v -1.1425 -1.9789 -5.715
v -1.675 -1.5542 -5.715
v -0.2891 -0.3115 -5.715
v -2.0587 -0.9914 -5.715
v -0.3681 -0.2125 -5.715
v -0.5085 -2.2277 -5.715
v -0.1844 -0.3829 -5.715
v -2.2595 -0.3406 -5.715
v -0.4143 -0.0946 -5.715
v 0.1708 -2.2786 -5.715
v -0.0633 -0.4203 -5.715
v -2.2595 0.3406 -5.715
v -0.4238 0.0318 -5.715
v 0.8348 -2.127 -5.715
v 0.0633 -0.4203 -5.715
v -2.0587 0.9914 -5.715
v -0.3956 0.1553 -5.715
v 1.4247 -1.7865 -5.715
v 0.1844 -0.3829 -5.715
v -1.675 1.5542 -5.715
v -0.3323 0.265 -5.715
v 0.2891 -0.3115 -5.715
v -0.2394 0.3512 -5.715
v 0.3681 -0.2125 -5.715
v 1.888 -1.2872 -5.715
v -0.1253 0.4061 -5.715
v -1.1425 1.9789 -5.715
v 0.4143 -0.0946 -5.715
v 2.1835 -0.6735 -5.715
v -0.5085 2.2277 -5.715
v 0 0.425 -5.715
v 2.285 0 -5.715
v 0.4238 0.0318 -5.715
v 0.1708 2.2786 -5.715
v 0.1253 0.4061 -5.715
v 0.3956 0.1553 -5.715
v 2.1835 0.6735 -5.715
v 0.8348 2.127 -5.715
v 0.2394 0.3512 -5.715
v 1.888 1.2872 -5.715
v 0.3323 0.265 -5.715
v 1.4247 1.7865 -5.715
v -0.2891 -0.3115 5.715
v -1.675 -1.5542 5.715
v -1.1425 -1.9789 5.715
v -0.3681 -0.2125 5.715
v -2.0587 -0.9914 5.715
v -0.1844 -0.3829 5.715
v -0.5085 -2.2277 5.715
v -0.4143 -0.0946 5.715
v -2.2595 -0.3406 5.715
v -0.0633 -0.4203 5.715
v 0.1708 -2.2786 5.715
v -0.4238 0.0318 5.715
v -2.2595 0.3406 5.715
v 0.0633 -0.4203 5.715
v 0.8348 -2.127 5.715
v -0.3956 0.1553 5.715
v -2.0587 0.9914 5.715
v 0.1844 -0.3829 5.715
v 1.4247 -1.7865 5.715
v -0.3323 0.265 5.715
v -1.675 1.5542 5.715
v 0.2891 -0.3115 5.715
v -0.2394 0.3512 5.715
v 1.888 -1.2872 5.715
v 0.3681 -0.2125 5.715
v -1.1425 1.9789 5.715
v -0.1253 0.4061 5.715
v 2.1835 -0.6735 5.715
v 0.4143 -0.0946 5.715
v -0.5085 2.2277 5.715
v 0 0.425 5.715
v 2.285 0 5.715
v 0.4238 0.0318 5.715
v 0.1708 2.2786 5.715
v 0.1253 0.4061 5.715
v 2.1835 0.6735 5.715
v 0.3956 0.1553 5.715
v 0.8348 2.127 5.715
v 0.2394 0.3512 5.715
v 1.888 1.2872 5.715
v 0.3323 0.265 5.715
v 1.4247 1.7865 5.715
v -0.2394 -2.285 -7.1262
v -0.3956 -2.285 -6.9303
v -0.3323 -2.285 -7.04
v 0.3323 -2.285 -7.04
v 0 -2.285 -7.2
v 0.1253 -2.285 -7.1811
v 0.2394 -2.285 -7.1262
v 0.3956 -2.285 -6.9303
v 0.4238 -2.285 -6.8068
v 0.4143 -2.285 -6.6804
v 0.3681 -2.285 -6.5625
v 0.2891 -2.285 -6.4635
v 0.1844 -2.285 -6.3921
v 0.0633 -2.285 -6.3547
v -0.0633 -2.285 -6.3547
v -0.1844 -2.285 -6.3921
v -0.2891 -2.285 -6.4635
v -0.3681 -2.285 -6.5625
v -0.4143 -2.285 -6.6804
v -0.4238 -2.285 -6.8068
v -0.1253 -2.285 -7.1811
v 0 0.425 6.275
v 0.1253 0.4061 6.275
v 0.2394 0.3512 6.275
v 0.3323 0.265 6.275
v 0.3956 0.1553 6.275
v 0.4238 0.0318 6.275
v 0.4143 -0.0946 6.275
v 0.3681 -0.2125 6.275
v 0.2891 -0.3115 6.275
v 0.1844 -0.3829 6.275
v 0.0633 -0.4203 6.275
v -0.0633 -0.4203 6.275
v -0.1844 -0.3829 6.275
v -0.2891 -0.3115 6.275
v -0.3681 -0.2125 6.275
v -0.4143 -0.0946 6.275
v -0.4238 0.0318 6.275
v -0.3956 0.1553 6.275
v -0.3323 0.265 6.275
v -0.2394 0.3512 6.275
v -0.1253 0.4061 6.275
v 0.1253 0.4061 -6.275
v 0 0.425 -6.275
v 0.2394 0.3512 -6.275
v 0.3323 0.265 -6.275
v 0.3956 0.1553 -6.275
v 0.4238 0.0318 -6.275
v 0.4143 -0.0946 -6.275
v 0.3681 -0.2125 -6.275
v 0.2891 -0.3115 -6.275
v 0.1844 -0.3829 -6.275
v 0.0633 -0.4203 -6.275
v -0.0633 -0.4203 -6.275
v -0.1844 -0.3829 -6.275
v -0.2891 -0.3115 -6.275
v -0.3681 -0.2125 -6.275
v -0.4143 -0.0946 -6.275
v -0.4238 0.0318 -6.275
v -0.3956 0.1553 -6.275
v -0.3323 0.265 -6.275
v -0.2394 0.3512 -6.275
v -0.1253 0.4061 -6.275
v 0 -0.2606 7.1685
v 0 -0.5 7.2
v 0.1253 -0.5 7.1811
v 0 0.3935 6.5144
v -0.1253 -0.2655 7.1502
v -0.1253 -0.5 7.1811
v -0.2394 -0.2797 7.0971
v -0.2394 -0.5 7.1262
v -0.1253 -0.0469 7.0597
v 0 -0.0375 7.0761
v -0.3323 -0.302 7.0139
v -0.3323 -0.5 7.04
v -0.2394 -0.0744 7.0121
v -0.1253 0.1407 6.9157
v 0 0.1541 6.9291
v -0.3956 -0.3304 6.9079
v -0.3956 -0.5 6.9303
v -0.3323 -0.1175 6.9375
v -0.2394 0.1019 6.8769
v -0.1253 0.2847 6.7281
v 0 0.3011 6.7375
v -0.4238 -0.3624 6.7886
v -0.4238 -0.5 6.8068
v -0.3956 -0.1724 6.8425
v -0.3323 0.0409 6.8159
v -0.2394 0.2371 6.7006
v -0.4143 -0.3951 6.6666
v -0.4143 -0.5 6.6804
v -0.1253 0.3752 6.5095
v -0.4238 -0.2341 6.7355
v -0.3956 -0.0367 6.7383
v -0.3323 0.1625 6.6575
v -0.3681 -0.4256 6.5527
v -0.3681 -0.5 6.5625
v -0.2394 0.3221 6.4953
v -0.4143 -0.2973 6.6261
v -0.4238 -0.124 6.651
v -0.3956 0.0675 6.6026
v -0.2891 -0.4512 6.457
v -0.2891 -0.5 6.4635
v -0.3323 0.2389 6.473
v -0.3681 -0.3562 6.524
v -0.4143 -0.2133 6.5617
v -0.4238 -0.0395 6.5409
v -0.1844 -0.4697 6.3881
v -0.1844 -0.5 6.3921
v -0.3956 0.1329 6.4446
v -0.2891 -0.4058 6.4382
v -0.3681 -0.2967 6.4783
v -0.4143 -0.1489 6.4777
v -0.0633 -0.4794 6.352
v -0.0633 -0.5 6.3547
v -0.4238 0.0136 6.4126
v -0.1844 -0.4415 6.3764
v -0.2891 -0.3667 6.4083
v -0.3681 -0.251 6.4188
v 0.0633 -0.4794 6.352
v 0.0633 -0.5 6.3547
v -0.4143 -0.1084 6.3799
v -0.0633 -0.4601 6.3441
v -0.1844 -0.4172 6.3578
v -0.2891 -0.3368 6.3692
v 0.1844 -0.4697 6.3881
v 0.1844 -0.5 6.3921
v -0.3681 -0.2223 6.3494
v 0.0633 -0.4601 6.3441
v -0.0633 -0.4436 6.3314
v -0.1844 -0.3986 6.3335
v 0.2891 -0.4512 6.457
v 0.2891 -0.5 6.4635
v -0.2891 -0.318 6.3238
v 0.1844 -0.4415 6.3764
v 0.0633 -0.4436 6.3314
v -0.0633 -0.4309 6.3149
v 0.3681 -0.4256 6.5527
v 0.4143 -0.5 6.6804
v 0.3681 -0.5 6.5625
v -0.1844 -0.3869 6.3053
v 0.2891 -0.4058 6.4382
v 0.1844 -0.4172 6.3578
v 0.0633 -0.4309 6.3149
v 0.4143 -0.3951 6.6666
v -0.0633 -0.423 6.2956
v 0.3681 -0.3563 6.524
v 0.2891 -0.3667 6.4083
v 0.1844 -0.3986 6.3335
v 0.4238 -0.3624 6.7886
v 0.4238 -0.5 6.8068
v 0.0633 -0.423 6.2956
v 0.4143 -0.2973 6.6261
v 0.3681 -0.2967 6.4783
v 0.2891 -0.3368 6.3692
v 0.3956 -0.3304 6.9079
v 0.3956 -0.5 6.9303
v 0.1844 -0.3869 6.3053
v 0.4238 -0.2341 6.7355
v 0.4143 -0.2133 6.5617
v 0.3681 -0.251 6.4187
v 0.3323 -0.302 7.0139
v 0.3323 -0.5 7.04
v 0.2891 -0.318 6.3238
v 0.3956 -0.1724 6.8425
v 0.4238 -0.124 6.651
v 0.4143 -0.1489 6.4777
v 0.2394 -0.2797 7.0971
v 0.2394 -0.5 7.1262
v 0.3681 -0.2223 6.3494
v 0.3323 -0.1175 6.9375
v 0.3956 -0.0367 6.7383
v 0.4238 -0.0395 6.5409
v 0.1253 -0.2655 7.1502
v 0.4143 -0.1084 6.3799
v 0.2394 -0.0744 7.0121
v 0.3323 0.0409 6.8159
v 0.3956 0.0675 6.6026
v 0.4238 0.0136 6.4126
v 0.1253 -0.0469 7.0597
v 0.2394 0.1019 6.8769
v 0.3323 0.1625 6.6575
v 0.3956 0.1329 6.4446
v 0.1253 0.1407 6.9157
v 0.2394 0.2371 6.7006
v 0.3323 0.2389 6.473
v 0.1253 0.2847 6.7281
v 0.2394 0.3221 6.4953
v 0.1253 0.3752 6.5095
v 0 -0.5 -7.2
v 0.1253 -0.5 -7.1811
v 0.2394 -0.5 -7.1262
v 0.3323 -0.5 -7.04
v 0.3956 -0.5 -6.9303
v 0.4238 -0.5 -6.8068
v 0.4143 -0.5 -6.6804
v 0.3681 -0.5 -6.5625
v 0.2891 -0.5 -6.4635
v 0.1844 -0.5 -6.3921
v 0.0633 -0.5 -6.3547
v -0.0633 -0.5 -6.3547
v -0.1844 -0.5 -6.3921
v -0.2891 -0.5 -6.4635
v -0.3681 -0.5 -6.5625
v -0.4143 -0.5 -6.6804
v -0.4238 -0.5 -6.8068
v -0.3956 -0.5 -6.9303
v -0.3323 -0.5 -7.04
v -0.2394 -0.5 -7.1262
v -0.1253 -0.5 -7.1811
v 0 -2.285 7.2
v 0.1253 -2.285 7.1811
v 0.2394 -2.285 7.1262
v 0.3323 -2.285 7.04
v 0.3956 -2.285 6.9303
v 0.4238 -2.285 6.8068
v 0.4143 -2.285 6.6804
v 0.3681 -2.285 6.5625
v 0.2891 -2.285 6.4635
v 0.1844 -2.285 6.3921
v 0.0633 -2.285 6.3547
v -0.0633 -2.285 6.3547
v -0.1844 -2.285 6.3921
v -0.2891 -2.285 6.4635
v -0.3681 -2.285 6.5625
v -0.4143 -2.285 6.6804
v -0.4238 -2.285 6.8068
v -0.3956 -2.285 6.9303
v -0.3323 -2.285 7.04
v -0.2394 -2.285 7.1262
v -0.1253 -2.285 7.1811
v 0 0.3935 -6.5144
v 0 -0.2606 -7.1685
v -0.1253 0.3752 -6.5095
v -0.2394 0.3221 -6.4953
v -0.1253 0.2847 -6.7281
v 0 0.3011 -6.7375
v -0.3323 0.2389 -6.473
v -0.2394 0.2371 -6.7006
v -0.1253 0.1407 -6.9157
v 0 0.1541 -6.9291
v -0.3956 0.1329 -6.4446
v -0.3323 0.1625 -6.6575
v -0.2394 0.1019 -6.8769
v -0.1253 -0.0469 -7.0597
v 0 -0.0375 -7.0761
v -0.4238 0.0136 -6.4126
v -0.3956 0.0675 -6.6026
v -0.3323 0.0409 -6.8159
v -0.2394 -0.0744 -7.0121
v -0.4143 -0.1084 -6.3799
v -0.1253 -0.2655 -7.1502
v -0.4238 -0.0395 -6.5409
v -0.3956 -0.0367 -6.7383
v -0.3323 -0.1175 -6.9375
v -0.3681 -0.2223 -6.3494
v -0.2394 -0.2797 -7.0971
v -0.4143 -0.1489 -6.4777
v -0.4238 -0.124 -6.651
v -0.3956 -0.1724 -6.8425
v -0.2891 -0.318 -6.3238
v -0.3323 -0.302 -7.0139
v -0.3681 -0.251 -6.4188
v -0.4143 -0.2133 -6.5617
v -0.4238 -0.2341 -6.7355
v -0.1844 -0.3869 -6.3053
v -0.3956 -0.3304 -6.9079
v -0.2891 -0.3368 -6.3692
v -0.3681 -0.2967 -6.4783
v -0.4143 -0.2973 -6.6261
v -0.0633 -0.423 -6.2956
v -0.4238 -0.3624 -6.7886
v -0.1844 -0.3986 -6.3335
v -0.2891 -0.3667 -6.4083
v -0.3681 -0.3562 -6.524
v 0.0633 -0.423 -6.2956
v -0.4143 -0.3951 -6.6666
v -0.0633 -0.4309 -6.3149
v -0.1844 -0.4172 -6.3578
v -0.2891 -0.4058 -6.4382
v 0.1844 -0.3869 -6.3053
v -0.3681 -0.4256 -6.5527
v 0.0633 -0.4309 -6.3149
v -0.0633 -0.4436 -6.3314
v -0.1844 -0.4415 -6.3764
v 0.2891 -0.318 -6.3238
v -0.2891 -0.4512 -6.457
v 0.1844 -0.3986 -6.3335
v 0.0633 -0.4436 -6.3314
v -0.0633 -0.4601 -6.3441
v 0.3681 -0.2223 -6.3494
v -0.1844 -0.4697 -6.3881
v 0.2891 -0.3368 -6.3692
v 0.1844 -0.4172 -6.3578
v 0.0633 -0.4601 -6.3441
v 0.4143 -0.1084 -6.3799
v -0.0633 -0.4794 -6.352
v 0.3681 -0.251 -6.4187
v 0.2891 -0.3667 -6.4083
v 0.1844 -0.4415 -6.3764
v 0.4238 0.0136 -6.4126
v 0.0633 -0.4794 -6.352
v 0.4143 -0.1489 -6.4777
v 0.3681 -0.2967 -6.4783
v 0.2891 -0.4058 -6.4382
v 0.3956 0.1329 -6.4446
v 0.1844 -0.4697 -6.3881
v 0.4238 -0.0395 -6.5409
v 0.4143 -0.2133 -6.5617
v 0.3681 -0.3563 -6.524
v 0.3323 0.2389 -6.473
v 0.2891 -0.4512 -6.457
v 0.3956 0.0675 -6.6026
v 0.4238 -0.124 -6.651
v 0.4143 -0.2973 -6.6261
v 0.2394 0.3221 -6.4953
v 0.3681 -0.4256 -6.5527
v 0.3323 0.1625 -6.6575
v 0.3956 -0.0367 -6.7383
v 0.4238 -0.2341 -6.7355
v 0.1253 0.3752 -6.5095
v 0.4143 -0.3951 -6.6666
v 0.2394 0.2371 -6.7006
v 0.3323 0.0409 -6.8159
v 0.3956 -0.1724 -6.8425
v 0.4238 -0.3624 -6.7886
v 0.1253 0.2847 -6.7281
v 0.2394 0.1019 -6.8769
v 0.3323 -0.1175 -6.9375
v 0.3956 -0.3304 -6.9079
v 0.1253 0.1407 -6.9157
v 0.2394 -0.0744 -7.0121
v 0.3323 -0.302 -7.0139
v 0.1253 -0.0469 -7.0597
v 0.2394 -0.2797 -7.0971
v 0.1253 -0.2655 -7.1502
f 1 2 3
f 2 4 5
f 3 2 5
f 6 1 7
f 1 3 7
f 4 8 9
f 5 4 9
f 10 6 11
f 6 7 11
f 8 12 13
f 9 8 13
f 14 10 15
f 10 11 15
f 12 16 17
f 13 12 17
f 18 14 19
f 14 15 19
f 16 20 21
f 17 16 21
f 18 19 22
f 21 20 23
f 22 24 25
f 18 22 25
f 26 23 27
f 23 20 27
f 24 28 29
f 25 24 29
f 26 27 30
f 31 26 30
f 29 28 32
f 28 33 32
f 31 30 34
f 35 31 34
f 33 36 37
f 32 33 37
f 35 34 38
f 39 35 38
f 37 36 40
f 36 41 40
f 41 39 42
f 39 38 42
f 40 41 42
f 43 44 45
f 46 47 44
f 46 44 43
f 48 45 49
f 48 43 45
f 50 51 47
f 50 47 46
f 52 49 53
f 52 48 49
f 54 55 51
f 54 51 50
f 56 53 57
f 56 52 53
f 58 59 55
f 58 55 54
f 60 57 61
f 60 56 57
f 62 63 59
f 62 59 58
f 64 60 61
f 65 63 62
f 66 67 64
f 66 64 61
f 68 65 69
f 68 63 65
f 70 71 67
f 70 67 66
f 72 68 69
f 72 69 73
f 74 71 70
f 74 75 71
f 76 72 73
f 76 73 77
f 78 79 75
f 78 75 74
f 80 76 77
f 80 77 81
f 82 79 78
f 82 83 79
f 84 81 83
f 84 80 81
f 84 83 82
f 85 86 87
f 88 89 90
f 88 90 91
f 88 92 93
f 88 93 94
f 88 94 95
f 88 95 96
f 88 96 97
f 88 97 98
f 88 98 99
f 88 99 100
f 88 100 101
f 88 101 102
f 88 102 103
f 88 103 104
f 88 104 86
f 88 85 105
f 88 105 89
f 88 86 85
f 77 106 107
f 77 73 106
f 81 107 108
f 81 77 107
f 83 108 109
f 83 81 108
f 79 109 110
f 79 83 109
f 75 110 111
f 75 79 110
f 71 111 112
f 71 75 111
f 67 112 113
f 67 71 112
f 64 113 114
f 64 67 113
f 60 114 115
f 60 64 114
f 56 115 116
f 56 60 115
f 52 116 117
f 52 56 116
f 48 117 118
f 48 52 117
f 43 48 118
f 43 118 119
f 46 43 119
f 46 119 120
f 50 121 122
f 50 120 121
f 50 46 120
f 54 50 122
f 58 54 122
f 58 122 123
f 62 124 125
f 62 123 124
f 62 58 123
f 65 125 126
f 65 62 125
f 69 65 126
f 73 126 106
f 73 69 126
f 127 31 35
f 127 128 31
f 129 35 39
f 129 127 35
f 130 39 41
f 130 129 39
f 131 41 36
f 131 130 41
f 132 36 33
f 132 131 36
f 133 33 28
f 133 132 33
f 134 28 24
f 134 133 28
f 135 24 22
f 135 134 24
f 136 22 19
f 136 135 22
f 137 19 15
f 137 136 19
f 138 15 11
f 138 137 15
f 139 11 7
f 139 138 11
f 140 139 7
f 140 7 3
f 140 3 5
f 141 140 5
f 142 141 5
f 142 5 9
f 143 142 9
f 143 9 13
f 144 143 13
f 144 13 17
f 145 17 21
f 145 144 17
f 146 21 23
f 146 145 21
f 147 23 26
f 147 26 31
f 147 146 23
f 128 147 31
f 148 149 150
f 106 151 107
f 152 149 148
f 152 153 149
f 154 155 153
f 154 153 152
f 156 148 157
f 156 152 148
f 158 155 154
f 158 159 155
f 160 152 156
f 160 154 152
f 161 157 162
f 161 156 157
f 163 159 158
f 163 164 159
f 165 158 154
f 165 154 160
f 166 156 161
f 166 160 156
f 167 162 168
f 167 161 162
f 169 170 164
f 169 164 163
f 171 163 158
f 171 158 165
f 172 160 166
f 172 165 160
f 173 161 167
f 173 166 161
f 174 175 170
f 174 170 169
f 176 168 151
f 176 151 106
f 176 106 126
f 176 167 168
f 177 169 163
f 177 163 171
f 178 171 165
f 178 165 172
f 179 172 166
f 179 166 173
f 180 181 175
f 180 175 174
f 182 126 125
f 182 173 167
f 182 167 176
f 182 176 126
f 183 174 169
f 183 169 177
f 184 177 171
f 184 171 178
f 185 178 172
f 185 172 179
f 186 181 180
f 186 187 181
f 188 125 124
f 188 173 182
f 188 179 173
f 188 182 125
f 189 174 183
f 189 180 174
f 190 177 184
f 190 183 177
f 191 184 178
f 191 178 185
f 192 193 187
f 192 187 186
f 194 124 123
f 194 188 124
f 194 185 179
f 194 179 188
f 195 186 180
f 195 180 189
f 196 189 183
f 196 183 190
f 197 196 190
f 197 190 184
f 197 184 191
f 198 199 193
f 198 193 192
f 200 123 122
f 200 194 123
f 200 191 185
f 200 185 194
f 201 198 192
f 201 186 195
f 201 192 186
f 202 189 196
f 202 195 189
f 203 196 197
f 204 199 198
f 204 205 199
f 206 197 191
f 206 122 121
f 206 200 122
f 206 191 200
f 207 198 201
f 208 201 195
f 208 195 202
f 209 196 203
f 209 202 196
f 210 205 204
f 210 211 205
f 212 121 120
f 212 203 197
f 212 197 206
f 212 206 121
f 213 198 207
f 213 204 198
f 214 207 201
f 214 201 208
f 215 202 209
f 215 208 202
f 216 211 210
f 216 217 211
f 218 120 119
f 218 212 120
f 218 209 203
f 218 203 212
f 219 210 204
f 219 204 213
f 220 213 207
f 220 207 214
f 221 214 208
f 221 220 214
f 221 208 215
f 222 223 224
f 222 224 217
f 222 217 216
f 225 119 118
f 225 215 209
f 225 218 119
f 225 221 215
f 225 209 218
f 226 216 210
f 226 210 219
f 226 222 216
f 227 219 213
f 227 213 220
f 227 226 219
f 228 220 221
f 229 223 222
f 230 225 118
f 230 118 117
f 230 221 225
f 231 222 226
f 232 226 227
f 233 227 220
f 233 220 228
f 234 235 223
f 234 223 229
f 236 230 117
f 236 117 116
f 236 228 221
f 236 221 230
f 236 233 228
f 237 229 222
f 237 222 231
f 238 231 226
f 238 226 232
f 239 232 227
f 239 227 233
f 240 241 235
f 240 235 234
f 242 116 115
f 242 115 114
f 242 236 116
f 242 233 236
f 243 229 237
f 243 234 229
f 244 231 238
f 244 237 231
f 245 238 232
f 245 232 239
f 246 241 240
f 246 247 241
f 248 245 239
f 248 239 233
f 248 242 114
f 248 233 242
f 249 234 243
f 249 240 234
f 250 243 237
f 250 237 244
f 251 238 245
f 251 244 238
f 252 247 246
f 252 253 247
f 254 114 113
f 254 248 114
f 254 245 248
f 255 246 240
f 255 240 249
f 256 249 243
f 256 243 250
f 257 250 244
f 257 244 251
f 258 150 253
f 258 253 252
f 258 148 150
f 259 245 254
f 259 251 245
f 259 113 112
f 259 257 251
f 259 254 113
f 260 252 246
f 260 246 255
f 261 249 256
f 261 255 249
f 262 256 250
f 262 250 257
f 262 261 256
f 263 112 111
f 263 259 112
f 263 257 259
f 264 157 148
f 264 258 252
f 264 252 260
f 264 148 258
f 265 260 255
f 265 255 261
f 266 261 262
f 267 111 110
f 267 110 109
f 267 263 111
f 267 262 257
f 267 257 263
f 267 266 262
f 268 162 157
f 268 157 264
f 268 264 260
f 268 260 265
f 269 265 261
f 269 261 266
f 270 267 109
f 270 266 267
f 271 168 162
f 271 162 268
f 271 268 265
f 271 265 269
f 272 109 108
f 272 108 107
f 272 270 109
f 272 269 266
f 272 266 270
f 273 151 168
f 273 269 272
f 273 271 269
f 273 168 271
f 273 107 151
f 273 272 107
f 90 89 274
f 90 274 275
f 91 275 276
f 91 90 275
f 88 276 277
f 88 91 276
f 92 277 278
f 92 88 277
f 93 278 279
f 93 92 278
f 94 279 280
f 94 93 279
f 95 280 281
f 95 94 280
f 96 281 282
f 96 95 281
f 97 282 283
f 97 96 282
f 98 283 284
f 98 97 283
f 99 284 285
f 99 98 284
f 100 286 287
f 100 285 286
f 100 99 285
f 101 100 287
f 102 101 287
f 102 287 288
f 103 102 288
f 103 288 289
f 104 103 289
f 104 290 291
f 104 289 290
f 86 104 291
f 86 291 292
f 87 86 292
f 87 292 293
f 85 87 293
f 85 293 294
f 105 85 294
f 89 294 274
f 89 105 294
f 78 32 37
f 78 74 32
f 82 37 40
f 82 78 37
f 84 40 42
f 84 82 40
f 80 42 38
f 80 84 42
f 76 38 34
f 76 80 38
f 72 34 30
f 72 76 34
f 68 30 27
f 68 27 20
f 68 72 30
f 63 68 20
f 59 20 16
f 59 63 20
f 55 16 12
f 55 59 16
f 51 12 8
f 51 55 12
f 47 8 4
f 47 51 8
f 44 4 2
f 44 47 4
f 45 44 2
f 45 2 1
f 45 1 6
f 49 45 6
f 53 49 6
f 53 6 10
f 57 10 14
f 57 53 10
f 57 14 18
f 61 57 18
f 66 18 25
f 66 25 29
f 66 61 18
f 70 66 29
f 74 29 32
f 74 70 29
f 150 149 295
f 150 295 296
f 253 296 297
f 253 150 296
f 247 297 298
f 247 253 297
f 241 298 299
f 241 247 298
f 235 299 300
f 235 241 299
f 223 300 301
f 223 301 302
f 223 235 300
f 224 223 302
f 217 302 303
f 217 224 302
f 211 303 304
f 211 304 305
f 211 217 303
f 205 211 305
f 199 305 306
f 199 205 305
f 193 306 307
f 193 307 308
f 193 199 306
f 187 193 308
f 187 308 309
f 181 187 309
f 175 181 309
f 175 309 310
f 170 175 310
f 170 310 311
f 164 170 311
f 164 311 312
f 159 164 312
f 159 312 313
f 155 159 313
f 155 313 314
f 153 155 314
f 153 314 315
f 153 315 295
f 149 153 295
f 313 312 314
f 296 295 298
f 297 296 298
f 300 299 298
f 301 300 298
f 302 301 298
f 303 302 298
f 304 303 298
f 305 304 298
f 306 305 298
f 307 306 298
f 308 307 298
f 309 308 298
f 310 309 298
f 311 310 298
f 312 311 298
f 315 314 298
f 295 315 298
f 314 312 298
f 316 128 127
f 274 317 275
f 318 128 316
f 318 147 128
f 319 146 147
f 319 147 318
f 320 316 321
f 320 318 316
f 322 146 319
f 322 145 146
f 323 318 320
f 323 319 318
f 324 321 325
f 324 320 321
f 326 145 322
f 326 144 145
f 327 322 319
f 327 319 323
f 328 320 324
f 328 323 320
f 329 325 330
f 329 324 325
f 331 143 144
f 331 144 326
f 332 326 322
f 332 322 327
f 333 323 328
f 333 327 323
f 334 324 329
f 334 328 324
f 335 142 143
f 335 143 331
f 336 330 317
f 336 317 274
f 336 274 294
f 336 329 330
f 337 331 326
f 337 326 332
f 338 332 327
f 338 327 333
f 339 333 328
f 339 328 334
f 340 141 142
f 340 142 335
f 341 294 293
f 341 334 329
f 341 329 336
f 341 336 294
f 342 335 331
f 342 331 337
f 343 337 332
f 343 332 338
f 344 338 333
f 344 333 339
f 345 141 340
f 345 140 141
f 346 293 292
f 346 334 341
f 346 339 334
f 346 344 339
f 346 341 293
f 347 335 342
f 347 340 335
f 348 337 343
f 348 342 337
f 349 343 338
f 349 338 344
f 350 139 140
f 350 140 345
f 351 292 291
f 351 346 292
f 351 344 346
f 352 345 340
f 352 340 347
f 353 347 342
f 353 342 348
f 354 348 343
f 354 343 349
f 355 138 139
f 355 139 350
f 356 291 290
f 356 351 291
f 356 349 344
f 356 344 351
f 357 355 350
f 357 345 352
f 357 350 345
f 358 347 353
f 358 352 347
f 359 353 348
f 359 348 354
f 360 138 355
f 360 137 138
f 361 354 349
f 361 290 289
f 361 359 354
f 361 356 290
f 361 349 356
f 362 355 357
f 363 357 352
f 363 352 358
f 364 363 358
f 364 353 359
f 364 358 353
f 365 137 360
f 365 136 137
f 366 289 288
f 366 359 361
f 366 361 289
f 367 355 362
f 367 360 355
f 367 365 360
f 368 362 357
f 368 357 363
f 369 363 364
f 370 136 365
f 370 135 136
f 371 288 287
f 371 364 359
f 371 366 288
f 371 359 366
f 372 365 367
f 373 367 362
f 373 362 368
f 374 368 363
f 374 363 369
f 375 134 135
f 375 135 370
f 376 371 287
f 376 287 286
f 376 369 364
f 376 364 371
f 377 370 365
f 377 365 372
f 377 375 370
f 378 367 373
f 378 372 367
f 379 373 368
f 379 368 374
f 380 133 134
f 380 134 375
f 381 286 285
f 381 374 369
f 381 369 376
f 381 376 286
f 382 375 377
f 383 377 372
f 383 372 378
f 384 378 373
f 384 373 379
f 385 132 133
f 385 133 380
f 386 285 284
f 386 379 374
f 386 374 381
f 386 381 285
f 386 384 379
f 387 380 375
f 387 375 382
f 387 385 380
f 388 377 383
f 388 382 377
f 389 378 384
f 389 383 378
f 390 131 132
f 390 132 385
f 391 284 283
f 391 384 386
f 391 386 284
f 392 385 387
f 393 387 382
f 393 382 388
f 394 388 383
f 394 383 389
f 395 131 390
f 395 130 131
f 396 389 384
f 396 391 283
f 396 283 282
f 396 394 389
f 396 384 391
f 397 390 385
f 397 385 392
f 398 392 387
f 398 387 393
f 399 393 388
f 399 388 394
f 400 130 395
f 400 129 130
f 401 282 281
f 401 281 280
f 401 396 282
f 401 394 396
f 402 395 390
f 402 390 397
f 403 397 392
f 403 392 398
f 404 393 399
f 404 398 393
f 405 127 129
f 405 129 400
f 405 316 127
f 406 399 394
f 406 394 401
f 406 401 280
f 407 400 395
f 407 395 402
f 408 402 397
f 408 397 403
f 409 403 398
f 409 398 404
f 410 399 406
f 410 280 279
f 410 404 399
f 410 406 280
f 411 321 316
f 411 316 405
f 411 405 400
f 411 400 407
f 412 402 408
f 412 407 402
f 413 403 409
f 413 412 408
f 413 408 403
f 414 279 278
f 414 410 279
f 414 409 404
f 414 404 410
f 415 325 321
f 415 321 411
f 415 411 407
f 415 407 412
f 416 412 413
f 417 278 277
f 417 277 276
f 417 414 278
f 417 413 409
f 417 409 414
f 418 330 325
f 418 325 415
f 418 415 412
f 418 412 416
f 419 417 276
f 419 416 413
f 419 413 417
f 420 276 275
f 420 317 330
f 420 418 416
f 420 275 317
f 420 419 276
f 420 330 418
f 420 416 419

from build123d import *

# Parameters (mm, degrees)
SKETCH1_R           = 2.285
BOSS_EXTRUDE1_DEPTH = 5.715
SWEEP1_PROFILE_R    = 0.425


with BuildPart() as part:
    # Sketch1 → Boss-Extrude1 (new, symmetric)
    with BuildSketch(Plane.XY):
        Circle(SKETCH1_R)
    extrude(amount=BOSS_EXTRUDE1_DEPTH, both=True)

    # Sweep1: sweep along a path in Sketch2
    with BuildLine(Plane(origin=(0, 0, 0), x_dir=(0, 0, -1), z_dir=(1, 0, 0))) as sweep1_path:
        Line((-6.775, -2.285), (-6.775, -0.5))
        ThreePointArc((-6.775, -0.5), (-6.628553391, -0.146446609), (-6.275, 0))
        Line((-6.275, 0), (6.275, 0))
        ThreePointArc((6.275, 0), (6.628553391, -0.146446609), (6.775, -0.5))
        Line((6.775, -0.5), (6.775, -2.285))
    # Sweep1 profile (on start of the path) → Sweep1 (sweep)
    with BuildSketch(Plane(origin=(0, -2.285, 6.775), x_dir=(0, 0, 1), z_dir=(0, 1, 0))):
        Circle(SWEEP1_PROFILE_R)
    sweep(path=sweep1_path.line)


solid = part.part
